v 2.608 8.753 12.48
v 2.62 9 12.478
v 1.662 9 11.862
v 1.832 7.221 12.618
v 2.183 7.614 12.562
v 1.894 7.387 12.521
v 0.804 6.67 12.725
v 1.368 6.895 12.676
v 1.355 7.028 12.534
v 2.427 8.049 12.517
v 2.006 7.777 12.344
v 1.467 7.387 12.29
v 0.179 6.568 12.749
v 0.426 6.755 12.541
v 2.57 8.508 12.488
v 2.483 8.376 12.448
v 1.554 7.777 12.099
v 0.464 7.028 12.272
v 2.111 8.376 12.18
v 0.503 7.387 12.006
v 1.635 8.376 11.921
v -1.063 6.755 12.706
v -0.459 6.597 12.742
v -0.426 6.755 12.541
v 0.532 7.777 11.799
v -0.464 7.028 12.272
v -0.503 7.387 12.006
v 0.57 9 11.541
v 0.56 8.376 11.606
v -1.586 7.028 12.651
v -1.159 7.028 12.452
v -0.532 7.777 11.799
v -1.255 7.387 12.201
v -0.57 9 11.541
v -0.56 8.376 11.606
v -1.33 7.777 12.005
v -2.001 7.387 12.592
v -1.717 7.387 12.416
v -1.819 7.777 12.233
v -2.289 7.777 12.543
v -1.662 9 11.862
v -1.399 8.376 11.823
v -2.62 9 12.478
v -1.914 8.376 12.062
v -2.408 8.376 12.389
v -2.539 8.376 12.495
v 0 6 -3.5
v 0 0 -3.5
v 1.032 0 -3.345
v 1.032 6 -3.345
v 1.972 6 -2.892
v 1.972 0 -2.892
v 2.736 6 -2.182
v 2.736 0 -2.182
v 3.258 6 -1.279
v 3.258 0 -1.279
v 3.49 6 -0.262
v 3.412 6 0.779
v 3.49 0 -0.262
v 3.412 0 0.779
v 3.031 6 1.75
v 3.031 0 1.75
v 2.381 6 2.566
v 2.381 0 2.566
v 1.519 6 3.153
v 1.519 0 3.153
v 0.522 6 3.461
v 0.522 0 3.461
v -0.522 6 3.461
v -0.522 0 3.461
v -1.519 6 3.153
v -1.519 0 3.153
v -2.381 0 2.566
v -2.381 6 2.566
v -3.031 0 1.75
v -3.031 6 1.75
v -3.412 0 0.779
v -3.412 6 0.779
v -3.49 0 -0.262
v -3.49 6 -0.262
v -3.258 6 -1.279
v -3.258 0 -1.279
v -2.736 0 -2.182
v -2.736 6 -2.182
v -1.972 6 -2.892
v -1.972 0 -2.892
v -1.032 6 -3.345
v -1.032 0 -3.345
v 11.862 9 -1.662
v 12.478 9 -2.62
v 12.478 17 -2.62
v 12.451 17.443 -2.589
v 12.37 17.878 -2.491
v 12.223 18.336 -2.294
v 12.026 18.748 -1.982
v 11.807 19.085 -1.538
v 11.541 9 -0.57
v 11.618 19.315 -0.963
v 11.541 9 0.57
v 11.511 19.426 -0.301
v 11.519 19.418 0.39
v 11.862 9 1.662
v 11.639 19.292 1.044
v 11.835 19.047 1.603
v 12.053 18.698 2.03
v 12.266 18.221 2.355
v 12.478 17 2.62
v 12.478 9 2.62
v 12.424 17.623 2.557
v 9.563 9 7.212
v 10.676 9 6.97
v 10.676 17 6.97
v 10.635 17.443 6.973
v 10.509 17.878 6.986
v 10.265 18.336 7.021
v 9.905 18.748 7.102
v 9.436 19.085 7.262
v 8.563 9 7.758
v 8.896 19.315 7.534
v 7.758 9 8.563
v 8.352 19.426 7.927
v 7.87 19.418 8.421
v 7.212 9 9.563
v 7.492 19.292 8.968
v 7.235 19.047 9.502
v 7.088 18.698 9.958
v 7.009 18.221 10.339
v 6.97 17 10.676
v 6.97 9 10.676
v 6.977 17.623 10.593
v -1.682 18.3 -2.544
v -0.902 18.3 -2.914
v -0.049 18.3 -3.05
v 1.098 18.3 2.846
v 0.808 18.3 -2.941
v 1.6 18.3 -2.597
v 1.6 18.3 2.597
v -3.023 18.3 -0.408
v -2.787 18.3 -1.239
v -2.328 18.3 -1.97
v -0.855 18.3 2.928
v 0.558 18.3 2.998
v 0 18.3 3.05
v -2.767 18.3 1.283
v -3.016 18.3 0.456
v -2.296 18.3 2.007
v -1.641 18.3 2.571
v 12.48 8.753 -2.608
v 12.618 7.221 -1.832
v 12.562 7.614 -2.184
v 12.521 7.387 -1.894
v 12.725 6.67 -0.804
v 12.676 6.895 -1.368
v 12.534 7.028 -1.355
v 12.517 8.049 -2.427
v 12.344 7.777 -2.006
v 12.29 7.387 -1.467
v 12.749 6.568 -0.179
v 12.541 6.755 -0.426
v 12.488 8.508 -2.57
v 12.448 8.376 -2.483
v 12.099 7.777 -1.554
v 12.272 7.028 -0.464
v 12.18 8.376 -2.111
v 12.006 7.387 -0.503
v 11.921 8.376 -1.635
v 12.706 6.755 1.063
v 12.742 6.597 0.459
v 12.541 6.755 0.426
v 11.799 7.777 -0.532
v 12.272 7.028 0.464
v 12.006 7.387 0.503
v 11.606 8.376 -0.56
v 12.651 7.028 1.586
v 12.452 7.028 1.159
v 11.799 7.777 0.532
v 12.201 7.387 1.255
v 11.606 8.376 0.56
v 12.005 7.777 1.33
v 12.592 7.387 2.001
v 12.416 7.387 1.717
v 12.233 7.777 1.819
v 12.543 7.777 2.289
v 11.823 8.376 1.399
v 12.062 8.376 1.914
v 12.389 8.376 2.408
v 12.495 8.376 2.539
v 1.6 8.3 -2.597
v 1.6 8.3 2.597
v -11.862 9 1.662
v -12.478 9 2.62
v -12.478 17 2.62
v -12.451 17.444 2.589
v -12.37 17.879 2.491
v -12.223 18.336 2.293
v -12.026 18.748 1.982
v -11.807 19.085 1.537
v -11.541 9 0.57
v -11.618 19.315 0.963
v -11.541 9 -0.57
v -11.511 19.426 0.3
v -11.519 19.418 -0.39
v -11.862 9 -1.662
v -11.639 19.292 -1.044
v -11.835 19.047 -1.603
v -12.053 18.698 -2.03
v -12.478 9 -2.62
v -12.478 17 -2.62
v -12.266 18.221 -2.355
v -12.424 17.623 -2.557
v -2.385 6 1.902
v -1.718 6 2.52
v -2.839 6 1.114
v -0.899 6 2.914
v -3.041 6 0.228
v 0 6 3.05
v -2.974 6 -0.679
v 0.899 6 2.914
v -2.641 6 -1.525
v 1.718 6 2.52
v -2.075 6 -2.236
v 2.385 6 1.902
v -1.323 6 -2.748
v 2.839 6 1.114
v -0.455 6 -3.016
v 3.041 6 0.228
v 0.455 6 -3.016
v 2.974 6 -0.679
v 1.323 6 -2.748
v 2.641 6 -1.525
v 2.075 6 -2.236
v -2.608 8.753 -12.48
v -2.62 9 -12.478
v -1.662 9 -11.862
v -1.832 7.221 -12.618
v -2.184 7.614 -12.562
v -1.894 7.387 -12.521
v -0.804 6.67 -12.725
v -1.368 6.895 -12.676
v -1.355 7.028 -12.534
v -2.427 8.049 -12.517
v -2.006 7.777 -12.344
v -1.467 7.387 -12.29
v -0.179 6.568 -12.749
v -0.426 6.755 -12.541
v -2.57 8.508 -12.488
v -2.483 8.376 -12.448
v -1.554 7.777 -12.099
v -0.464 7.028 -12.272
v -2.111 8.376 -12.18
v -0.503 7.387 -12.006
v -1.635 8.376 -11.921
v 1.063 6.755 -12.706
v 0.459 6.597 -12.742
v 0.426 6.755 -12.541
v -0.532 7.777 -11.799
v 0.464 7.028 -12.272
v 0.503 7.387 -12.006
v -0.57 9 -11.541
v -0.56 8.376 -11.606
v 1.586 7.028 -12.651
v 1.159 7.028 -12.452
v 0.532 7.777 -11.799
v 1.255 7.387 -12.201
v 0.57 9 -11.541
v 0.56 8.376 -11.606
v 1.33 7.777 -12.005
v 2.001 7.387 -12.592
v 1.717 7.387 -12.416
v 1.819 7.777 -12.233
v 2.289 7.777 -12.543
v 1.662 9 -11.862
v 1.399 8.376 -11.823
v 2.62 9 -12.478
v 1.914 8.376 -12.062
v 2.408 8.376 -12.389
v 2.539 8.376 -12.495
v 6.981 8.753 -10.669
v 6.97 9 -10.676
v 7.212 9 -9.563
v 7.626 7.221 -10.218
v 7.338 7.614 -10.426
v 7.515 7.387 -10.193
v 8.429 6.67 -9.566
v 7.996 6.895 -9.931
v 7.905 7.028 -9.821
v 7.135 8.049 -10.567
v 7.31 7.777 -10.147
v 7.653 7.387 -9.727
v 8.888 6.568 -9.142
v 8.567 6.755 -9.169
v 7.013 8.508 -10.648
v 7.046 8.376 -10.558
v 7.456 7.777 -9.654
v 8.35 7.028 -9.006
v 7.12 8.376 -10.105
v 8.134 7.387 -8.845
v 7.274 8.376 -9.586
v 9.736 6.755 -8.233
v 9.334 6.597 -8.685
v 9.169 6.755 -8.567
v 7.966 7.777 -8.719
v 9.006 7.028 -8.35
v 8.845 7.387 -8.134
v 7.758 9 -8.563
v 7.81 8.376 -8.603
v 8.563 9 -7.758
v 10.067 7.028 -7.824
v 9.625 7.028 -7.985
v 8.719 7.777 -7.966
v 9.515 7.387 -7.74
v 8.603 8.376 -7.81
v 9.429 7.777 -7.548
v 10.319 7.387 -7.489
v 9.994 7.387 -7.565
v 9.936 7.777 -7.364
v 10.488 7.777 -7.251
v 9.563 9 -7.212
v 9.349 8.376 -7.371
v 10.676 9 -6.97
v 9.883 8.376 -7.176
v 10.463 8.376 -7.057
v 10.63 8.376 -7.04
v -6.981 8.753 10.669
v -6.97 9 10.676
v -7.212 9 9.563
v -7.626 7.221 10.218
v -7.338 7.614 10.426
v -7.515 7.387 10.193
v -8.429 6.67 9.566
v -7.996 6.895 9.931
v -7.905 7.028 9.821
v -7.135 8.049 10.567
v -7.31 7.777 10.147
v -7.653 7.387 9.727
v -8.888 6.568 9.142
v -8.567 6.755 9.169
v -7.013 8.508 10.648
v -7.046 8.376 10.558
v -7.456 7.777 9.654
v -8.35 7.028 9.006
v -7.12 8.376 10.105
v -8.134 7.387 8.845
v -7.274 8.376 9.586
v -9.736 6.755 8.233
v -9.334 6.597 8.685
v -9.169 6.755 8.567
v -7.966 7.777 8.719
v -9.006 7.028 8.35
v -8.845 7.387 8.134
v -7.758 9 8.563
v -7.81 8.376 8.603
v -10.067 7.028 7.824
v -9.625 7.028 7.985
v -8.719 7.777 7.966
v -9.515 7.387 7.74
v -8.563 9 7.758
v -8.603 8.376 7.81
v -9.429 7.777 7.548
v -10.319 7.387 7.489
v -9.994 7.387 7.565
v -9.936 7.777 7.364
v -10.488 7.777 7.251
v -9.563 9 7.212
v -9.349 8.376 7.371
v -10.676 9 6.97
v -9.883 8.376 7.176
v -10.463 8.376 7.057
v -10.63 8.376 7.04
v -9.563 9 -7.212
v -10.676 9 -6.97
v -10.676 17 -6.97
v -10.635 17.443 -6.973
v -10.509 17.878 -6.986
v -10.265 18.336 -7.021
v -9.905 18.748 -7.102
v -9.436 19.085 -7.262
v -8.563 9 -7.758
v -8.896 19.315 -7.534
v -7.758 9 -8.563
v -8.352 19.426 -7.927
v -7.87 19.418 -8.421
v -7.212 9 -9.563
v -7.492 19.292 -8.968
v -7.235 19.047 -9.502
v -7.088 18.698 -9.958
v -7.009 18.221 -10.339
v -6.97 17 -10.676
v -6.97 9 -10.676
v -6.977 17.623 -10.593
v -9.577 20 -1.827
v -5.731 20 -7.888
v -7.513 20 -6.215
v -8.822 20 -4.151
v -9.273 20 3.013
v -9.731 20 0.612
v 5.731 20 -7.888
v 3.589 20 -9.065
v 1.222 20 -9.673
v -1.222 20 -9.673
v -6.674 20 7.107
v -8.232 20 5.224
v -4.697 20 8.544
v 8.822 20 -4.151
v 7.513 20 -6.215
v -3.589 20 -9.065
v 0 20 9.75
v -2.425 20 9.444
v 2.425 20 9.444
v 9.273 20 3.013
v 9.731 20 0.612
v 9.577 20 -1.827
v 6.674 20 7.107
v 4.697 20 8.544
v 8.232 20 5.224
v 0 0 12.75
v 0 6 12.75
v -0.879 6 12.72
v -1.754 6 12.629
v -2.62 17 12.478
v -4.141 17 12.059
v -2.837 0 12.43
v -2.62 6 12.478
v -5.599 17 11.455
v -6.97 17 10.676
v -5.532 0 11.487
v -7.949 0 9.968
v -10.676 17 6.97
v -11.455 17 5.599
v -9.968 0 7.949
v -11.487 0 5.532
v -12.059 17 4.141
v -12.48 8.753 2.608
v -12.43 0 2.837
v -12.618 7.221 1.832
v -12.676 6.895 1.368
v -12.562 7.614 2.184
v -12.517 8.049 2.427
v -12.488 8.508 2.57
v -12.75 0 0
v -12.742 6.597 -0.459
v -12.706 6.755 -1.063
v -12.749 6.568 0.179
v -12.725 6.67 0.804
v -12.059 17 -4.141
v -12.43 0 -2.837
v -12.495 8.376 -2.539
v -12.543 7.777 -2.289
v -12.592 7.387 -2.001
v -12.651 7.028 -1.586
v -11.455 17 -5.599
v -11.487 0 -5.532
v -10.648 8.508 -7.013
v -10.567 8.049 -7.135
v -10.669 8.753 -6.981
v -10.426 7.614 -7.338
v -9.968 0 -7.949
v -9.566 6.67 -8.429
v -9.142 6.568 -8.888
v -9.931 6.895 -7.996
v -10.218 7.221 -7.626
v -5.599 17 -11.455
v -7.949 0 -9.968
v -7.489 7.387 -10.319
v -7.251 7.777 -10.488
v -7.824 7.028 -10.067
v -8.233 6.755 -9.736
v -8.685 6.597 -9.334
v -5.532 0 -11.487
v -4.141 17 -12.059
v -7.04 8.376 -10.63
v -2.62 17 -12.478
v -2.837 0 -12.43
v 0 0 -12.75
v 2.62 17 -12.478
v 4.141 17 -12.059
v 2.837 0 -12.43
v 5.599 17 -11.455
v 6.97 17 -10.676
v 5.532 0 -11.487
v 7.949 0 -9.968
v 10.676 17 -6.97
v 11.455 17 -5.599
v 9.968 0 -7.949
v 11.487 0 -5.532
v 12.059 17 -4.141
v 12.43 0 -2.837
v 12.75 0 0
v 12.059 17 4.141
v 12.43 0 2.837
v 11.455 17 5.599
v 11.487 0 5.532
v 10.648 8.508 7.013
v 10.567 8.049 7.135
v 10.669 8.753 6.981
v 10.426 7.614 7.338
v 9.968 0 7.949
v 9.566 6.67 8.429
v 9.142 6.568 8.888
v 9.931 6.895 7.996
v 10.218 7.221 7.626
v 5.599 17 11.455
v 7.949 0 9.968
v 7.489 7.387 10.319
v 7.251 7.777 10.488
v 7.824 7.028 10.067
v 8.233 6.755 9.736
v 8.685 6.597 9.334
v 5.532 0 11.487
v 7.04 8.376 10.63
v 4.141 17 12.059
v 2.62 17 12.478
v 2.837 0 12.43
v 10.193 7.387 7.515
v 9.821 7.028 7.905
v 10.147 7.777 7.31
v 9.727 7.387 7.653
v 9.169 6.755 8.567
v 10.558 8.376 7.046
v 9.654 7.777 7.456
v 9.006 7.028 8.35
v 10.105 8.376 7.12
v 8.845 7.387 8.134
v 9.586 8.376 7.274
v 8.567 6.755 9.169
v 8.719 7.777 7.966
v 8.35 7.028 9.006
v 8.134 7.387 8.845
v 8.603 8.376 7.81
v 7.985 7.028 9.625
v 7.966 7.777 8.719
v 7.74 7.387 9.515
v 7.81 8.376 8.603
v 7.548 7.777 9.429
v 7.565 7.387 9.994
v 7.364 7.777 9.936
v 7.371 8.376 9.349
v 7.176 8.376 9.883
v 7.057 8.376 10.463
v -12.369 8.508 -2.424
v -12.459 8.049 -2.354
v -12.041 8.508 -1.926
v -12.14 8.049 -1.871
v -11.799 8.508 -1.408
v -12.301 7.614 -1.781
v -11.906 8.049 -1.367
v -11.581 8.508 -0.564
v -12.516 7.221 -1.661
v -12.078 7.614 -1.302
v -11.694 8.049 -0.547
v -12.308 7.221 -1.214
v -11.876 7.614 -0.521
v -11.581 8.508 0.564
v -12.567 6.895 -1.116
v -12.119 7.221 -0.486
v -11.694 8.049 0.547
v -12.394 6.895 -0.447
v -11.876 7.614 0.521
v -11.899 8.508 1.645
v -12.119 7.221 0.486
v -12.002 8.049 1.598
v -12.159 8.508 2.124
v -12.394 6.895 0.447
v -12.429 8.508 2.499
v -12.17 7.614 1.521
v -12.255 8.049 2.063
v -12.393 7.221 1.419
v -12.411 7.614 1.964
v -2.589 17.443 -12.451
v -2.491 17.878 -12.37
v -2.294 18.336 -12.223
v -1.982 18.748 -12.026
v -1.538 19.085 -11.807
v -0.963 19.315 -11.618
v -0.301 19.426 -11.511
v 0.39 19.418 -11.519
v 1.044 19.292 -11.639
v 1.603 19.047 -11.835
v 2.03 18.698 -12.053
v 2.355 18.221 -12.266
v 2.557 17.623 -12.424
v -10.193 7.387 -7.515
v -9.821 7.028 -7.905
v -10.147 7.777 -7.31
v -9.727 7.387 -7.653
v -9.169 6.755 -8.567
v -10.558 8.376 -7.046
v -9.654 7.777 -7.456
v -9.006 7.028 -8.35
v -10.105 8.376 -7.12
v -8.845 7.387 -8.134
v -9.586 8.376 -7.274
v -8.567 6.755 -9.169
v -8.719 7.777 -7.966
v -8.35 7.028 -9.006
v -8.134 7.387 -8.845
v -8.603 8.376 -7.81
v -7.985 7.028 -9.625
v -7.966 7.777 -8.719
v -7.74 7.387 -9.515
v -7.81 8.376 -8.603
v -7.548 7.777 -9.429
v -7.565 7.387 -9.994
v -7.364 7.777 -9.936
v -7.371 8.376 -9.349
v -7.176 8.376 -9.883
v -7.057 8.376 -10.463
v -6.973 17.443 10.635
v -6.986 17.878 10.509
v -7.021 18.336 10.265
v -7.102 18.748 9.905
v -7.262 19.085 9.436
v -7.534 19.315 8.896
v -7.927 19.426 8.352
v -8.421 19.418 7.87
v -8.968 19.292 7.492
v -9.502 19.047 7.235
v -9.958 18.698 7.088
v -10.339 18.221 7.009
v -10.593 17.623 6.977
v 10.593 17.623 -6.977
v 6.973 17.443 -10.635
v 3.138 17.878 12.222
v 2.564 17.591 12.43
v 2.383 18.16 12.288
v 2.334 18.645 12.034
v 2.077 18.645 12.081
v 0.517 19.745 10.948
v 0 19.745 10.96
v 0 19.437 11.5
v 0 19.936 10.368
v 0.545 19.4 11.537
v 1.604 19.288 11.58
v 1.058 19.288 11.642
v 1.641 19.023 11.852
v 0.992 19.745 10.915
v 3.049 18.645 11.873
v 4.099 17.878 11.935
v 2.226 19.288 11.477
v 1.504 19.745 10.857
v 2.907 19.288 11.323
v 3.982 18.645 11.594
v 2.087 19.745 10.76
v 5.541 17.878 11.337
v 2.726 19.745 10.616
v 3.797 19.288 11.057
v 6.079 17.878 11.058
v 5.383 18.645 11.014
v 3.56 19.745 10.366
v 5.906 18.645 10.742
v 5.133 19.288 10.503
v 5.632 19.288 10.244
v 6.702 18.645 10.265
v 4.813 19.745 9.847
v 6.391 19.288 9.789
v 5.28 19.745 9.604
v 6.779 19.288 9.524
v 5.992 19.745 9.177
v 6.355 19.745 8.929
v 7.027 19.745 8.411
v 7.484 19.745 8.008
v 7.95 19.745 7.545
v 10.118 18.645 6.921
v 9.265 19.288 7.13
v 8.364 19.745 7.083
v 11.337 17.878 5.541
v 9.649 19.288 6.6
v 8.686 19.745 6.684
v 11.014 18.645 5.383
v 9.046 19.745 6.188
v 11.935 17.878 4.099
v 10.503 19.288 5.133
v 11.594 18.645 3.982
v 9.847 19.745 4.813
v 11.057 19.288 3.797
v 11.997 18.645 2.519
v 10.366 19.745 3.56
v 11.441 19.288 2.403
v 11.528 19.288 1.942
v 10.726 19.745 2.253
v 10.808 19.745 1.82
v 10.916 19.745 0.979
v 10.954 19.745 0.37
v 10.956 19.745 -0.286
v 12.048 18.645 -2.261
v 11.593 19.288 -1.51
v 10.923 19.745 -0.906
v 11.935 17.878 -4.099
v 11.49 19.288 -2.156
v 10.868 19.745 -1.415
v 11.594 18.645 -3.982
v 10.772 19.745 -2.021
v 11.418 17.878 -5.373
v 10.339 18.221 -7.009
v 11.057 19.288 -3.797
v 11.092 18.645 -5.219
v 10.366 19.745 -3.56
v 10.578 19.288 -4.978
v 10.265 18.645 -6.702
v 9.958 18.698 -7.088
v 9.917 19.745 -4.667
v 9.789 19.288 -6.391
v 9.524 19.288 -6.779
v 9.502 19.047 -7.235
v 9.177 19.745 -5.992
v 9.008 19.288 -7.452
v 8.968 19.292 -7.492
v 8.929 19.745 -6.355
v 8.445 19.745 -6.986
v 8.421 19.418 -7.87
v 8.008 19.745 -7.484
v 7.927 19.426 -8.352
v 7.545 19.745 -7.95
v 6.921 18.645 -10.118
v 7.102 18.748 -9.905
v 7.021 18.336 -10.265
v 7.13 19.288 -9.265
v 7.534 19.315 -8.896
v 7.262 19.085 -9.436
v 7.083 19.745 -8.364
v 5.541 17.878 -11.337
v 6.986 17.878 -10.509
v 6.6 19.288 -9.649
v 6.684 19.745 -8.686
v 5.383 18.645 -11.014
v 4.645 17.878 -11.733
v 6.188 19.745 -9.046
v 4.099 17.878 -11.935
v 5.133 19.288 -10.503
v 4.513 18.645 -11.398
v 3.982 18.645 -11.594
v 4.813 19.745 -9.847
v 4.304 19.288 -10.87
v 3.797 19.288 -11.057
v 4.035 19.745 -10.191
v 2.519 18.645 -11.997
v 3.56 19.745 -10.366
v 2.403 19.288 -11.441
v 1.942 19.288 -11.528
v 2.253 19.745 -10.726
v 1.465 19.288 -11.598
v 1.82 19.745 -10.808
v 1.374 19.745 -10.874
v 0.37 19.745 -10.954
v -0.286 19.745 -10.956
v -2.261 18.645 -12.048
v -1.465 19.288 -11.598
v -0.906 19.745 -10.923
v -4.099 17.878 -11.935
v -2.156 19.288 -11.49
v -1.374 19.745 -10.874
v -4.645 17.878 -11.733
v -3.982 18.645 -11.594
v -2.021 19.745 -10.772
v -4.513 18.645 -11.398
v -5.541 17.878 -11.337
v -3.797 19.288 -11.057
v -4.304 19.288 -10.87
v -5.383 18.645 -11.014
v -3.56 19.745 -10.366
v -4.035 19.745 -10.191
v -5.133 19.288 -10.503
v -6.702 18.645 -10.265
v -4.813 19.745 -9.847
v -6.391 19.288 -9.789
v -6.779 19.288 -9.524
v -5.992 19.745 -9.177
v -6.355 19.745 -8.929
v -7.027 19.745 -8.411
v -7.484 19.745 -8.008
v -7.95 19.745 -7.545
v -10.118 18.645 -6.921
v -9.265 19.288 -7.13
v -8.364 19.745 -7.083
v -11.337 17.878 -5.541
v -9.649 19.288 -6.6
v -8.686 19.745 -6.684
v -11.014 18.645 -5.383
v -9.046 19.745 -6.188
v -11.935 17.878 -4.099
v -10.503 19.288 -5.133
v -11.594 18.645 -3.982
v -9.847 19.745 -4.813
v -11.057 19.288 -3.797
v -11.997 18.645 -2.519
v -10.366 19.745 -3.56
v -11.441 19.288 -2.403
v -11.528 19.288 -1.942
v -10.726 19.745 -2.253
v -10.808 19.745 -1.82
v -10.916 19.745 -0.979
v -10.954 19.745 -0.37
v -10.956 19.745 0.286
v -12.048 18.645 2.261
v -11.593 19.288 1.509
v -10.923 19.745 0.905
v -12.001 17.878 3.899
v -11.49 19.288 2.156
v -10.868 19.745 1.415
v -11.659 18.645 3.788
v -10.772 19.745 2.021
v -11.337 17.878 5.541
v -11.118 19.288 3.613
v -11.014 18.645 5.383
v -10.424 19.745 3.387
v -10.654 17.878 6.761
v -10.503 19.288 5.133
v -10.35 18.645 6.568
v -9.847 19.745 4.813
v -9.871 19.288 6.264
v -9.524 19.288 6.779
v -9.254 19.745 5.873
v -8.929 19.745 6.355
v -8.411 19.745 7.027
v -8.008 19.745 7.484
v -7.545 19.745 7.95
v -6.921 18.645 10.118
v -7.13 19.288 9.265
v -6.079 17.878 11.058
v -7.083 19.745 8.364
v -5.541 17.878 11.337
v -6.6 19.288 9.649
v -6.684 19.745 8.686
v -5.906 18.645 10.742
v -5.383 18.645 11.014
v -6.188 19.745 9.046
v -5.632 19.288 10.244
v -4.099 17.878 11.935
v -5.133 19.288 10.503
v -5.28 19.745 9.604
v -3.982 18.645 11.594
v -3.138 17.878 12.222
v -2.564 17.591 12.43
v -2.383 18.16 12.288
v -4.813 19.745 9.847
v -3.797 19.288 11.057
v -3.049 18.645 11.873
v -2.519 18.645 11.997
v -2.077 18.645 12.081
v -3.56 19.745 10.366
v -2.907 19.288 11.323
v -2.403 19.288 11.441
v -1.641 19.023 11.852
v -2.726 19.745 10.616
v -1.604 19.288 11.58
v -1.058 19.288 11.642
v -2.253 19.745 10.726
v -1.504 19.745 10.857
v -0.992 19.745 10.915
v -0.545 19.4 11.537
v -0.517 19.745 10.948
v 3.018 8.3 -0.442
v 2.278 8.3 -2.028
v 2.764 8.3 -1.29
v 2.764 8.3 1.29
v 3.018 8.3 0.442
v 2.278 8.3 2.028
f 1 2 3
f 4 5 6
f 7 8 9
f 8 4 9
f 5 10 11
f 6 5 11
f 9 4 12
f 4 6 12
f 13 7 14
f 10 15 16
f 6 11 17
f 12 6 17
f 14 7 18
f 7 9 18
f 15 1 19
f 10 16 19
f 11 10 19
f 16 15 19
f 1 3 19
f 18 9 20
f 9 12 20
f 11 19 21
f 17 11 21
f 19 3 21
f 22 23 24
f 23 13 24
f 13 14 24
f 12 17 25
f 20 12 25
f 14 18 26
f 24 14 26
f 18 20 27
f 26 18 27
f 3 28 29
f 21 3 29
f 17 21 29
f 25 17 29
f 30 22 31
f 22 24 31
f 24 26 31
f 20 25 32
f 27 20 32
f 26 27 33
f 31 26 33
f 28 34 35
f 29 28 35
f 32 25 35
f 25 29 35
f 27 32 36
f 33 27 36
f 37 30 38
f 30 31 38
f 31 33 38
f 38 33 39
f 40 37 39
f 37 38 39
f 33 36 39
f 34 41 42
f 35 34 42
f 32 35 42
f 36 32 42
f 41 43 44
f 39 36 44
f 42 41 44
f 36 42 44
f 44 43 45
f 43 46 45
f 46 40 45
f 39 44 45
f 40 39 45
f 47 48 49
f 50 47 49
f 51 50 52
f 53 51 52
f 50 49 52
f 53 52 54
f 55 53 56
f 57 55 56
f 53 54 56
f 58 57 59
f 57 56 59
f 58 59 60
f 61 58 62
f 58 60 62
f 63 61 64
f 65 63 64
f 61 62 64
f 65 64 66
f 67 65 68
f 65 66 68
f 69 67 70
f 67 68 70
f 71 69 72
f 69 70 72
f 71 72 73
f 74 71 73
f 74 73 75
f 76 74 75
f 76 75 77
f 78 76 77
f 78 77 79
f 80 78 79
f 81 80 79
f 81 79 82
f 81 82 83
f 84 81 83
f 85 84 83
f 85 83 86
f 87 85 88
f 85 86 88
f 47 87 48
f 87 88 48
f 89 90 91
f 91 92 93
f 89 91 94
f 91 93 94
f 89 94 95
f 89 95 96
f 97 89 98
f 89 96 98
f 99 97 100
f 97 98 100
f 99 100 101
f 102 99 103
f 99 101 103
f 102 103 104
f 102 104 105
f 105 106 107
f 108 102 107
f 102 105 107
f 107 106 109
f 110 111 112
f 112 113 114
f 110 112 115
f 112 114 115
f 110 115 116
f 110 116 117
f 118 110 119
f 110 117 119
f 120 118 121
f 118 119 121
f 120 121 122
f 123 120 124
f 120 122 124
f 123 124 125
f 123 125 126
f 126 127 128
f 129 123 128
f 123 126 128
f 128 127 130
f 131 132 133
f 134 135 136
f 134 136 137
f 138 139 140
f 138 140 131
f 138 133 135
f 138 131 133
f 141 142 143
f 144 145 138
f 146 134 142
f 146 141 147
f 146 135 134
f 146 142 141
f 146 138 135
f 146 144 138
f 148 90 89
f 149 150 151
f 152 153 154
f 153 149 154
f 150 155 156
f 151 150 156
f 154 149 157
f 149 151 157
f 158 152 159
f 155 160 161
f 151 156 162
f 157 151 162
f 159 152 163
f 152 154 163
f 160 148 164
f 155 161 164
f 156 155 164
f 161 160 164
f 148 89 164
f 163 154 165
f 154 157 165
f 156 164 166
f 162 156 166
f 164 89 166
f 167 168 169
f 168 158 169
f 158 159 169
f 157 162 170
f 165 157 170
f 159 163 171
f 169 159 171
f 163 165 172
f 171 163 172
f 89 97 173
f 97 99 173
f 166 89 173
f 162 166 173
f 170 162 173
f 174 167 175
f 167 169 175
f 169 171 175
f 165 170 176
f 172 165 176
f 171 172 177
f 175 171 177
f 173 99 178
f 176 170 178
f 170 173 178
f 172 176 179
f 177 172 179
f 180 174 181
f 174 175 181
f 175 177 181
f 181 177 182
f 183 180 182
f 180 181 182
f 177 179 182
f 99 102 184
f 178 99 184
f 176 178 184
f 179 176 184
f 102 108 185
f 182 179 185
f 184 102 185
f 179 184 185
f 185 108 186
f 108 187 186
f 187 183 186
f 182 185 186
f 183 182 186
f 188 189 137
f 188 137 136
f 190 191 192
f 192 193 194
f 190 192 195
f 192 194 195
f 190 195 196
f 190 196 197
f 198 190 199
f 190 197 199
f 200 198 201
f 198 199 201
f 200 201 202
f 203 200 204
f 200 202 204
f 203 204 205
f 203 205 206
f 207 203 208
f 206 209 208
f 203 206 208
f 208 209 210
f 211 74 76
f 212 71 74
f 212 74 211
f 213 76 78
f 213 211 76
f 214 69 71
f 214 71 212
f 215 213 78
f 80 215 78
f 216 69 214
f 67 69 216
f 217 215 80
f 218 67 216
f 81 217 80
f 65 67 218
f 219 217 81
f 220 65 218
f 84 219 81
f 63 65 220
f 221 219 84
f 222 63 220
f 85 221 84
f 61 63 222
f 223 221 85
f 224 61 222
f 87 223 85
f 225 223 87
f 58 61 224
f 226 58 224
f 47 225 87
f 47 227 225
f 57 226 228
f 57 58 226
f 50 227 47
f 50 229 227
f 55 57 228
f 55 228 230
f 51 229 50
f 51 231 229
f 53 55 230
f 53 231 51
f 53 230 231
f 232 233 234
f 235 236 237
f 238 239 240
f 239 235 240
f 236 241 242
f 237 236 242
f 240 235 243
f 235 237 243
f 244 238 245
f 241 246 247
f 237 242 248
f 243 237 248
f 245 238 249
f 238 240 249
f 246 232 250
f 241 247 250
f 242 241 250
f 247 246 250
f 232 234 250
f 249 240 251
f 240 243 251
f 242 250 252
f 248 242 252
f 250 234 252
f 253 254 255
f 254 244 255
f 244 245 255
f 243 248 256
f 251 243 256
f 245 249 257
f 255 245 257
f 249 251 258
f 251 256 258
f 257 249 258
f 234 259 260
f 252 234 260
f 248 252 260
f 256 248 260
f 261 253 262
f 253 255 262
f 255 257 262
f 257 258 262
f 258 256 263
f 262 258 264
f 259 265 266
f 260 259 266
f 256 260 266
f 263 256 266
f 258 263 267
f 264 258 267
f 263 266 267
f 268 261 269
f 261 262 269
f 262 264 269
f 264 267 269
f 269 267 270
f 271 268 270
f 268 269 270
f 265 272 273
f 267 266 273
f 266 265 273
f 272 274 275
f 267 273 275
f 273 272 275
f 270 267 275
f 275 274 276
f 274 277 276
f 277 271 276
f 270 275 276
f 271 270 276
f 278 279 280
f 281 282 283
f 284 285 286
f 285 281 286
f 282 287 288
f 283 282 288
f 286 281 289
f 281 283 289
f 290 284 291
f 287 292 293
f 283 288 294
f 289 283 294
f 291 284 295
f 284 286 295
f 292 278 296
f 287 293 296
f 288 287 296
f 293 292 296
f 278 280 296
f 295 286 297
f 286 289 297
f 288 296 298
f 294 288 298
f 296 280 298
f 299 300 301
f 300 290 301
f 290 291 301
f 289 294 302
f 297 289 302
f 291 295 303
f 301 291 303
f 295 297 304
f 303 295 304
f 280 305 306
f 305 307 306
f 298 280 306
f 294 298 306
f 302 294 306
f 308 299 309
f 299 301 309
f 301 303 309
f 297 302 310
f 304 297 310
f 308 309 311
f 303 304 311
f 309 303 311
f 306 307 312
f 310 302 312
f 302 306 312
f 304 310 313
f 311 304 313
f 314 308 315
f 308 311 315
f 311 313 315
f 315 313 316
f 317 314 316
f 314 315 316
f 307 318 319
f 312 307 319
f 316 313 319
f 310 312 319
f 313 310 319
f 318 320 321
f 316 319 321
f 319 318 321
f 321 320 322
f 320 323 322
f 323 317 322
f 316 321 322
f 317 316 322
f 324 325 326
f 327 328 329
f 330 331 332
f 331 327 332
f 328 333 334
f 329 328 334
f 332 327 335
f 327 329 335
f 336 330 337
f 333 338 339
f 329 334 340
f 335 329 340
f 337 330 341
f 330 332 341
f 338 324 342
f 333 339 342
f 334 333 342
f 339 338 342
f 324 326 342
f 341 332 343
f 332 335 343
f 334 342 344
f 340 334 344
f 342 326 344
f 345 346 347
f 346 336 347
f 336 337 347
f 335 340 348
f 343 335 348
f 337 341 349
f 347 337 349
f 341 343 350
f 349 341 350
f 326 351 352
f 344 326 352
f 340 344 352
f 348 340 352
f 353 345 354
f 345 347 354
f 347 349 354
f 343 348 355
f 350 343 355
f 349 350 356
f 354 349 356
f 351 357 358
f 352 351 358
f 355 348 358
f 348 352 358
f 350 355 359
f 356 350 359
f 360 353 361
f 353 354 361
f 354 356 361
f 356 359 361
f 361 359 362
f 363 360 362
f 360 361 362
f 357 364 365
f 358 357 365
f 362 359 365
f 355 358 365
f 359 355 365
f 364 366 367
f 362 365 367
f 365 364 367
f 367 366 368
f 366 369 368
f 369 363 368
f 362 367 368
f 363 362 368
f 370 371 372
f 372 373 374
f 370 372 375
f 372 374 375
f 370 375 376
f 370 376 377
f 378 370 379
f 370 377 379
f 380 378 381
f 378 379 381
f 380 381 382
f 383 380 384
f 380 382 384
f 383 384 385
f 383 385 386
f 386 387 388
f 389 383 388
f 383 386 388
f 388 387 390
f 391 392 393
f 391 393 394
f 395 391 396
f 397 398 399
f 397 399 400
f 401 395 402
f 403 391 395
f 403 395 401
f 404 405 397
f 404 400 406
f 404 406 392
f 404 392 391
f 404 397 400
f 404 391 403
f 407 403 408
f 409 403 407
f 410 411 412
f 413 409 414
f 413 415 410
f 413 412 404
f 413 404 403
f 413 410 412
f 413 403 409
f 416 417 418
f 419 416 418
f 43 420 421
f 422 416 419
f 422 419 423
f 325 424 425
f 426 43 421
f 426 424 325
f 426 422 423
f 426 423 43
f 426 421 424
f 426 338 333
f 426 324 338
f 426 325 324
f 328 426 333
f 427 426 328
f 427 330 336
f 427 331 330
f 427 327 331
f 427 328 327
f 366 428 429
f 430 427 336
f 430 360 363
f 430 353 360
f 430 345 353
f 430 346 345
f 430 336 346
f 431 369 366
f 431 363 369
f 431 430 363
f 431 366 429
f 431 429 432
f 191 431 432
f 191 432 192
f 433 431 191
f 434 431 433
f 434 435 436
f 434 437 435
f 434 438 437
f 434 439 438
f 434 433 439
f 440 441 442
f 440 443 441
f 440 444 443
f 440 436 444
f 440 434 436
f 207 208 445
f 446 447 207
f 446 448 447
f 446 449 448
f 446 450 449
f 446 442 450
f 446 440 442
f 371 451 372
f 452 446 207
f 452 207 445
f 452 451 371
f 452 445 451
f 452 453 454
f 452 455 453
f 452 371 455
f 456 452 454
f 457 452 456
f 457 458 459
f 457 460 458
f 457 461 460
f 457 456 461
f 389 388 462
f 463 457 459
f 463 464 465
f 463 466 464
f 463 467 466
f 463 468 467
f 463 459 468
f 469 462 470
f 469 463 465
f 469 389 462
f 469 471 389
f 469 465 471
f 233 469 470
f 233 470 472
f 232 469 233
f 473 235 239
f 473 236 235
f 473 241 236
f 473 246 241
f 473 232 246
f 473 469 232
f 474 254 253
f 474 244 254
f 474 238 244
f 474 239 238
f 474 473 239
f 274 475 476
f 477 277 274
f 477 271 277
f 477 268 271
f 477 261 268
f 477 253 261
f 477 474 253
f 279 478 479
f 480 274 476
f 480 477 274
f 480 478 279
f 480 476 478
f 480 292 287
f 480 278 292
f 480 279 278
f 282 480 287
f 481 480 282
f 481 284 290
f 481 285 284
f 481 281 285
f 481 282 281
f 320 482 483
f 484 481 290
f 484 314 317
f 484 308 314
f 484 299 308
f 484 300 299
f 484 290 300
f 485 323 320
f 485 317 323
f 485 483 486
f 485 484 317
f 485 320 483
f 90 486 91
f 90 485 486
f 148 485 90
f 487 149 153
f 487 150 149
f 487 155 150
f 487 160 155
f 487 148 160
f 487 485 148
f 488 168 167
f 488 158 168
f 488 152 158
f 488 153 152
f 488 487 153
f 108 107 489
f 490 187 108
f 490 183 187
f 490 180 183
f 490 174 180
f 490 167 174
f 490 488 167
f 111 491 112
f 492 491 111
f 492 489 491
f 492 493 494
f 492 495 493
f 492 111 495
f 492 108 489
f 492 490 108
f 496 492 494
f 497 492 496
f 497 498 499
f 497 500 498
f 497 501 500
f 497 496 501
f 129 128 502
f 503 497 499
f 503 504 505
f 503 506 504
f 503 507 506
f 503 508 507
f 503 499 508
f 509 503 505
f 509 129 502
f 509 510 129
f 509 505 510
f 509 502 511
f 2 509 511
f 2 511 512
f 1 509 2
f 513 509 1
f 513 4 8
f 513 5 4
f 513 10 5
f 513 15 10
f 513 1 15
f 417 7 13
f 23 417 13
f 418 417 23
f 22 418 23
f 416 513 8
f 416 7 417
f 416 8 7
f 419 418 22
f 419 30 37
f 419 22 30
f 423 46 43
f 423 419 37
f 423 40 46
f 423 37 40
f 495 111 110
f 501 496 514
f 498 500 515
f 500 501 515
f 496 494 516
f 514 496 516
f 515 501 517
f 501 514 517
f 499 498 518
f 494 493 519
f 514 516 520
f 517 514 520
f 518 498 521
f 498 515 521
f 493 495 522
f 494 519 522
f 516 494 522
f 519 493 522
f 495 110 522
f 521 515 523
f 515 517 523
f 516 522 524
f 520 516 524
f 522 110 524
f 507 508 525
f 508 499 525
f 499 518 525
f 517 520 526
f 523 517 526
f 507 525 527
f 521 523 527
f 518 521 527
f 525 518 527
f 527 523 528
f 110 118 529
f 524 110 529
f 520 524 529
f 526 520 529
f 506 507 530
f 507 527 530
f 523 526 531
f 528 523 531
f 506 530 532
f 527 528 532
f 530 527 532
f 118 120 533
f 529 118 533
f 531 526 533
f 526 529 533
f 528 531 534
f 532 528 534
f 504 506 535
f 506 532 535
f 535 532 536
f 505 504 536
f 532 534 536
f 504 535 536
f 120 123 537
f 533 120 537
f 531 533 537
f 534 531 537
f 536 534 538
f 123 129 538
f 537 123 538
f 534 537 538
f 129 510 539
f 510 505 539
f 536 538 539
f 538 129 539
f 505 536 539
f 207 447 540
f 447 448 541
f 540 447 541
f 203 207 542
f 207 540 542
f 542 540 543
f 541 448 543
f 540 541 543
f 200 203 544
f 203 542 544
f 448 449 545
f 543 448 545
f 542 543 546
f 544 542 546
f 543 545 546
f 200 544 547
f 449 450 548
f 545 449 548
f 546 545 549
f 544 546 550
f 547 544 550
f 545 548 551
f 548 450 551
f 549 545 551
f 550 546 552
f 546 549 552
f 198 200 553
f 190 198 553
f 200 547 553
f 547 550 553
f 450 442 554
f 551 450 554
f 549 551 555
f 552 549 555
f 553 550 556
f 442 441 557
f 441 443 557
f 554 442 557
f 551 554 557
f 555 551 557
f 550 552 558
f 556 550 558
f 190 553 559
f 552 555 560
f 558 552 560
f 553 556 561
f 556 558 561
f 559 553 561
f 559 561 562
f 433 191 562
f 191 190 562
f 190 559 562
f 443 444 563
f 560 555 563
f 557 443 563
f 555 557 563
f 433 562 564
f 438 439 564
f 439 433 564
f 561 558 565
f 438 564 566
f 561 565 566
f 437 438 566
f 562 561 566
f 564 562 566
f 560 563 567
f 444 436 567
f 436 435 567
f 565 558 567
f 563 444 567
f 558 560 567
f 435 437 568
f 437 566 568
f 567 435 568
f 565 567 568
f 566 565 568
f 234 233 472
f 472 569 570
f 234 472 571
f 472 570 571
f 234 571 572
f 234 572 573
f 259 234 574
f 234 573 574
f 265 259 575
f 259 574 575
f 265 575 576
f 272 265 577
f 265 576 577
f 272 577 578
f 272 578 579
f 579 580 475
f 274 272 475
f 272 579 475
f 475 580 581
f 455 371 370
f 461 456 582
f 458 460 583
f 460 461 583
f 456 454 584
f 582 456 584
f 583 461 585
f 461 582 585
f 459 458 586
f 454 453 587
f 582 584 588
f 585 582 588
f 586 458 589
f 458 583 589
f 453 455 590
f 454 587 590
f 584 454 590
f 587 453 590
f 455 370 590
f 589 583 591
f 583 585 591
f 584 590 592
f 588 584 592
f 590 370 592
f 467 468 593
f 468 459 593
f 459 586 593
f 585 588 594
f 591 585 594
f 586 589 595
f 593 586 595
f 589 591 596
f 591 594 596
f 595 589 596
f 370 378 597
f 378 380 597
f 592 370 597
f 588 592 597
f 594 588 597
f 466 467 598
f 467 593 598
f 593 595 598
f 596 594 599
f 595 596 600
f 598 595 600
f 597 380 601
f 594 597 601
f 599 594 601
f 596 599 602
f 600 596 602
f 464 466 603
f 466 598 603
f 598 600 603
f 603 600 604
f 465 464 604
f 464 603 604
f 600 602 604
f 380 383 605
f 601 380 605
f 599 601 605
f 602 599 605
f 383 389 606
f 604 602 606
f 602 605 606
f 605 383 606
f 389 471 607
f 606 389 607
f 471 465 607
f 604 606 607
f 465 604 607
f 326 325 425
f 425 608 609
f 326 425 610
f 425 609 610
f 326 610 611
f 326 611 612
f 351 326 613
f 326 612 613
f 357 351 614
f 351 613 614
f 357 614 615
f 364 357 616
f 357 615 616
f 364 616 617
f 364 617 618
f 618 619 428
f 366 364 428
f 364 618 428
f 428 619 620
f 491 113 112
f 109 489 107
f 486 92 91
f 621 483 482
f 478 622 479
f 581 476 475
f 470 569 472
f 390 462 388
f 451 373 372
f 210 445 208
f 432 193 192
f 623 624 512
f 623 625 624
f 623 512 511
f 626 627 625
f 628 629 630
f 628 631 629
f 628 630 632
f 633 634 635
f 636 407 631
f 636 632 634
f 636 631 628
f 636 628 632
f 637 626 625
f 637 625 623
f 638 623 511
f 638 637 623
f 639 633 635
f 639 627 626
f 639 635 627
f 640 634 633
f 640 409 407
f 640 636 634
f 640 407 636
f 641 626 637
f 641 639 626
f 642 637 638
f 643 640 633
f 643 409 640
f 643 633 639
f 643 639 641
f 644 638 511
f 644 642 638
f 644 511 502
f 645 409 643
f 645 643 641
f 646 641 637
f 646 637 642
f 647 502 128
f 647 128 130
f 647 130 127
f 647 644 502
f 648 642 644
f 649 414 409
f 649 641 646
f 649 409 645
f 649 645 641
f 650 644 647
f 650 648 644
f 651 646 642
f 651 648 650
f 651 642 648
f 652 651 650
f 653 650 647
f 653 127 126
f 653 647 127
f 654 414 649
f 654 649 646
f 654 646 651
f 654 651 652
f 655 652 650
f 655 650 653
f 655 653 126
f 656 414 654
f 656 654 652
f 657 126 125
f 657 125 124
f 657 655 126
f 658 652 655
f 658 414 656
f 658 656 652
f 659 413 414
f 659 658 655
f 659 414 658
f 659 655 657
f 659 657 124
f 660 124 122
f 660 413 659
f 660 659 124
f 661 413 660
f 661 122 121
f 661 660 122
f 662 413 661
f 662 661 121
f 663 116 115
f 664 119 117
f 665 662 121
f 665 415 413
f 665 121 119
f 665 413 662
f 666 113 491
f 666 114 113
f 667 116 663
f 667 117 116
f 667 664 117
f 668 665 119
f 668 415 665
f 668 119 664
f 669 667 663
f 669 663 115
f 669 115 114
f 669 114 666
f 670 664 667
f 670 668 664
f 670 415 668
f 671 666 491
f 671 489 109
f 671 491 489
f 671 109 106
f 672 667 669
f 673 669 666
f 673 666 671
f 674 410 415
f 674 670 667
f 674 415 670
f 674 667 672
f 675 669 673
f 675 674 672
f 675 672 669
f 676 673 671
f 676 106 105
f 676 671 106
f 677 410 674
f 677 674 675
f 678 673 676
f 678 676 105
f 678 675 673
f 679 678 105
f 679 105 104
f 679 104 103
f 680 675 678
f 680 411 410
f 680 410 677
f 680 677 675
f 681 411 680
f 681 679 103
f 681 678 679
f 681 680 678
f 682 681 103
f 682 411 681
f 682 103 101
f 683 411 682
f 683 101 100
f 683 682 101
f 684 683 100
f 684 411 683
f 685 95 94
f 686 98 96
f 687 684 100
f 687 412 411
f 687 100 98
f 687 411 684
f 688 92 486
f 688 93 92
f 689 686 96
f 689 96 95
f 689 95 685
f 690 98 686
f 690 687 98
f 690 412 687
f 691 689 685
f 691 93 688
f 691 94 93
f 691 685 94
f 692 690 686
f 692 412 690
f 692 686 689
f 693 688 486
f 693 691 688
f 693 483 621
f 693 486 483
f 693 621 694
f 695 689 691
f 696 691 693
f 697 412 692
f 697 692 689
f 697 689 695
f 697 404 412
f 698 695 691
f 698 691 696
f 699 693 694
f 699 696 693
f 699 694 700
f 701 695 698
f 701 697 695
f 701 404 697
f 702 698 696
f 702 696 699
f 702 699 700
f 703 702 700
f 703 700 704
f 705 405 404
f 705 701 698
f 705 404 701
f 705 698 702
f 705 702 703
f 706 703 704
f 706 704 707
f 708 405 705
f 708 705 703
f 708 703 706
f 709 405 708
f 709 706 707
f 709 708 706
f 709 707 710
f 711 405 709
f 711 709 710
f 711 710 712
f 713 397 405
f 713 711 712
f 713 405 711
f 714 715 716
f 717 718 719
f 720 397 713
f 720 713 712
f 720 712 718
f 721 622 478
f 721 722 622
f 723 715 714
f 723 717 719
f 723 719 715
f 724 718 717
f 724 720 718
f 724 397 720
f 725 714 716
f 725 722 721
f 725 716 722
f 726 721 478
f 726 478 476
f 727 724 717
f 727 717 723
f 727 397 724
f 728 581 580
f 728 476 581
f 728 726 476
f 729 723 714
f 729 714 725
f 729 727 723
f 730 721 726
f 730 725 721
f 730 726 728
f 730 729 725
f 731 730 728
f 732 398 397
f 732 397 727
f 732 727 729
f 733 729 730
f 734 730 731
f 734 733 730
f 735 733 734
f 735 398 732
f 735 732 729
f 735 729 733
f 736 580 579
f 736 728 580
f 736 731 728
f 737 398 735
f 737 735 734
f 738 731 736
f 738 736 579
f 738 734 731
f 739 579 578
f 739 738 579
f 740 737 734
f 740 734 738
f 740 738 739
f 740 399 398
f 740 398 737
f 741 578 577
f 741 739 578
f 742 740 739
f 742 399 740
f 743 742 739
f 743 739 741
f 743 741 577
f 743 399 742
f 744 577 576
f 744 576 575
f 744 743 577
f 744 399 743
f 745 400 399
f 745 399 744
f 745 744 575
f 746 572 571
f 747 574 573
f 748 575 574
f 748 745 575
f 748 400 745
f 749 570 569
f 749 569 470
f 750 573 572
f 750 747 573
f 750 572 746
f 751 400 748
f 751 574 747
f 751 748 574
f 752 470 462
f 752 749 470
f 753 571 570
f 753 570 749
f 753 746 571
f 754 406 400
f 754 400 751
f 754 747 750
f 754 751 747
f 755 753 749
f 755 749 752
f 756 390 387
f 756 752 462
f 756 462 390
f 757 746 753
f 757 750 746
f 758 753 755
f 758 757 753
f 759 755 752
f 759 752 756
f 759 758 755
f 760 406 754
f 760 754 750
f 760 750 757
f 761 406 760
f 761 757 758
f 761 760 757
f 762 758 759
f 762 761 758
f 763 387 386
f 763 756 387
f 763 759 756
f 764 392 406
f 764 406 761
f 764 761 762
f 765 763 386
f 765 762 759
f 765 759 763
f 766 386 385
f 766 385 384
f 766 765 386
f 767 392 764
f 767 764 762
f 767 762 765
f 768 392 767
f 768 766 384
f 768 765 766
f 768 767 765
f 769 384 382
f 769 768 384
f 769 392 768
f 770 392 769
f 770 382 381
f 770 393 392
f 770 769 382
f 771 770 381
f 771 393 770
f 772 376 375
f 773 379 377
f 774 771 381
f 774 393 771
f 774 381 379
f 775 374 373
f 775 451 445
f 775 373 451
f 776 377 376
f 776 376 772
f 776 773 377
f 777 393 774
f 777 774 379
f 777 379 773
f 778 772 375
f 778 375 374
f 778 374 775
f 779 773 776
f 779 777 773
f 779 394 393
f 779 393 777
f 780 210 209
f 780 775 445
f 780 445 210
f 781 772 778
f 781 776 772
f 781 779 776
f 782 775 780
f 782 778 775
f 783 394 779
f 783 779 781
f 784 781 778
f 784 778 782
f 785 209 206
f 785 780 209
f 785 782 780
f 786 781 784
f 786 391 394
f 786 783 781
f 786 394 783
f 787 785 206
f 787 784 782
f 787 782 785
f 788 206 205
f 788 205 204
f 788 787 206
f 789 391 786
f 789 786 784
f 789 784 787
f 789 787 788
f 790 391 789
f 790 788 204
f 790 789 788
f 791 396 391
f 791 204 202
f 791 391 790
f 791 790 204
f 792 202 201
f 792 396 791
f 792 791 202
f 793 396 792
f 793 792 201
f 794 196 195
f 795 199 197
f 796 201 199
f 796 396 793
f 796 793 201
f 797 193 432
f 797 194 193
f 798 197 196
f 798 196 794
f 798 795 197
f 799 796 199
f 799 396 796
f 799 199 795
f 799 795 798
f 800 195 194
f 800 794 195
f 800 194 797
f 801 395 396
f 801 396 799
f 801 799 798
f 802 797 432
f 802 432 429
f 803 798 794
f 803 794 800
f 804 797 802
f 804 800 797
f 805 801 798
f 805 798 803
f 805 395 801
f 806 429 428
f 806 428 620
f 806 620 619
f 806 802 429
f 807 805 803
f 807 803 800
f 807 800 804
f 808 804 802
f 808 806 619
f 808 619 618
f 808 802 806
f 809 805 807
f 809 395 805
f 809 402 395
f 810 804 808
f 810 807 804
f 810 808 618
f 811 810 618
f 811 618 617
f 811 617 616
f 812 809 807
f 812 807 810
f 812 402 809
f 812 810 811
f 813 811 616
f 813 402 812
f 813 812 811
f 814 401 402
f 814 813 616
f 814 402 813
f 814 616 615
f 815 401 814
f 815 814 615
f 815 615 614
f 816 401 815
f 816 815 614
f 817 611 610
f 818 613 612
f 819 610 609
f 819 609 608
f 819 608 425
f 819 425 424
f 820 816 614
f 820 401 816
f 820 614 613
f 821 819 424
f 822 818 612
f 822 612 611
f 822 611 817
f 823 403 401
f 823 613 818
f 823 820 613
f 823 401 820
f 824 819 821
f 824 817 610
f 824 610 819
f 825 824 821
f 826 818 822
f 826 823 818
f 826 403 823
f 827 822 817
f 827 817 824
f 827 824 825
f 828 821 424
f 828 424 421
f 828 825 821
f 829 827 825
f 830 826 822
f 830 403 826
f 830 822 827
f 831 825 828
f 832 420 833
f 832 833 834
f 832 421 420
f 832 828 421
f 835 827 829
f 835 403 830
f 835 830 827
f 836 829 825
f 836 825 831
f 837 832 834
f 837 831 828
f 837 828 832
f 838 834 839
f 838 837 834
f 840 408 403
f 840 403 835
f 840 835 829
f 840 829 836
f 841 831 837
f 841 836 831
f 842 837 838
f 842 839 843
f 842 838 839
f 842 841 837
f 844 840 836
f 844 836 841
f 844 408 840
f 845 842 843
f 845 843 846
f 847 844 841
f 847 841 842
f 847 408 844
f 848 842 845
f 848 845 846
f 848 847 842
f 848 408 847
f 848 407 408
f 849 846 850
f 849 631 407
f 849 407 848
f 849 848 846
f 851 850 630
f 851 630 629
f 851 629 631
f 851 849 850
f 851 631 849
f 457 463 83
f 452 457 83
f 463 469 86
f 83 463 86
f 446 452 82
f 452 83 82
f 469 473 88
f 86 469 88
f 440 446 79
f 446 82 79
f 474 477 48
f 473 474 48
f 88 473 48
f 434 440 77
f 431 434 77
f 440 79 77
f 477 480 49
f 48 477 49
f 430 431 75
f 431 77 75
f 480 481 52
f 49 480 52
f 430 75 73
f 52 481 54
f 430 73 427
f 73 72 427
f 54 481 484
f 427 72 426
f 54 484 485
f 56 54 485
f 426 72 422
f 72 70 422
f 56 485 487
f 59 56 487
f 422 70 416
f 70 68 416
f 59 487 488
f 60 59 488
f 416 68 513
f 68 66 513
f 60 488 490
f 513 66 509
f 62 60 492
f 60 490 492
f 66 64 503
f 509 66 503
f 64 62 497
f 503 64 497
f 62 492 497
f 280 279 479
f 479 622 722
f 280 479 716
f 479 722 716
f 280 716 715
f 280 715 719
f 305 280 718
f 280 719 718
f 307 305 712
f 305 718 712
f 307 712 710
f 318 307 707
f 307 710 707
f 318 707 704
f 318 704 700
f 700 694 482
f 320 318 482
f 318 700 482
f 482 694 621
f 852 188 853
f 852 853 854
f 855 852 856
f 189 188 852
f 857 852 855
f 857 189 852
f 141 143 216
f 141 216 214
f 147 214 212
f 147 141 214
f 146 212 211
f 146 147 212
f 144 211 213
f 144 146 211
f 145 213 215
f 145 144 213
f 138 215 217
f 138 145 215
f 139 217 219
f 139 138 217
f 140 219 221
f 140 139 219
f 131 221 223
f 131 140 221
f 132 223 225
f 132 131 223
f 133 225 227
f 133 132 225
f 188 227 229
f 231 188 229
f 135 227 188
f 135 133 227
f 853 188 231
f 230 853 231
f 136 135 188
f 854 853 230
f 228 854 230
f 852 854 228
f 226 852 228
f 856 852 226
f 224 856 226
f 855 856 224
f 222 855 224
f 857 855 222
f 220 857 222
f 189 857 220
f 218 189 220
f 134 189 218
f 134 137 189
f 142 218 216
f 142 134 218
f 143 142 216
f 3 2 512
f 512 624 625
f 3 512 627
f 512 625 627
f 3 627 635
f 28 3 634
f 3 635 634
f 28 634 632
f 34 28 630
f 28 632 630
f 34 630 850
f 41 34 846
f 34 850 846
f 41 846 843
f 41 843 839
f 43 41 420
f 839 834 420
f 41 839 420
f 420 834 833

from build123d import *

# Parameters (mm, degrees)
SKETCH1_R               = 12.75
BOSS_EXTRUDE1_DEPTH     = 20
CUT_EXTRUDE1_DEPTH      = 27.928145127
CUT_EXTRUDE1_DEPTH_BACK = 18.3
SKETCH2_R               = 3.05
SKETCH3_R               = 3.5
CUT_EXTRUDE2_DEPTH      = 6
FILLET1_R               = 3
SKETCH5_R               = 4
CUT_EXTRUDE3_DEPTH      = 14
FILLET3_R               = 3
BOSS_EXTRUDE2_START     = 10
BOSS_EXTRUDE2_DEPTH     = 10


with BuildPart() as part:
    # Sketch1 → Boss-Extrude1 (new body)
    with BuildSketch(Plane(origin=(0, 0, 0), x_dir=(1, 0, 0), z_dir=(0, 1, 0))):
        with Locations(Location((0, 0, 0), (0, 0, 270))):
            Circle(SKETCH1_R)
    extrude(amount=BOSS_EXTRUDE1_DEPTH)

    # Sketch2 → Cut-Extrude1 (cut, two sides: drawn at the far end of the back side and taken through both)
    with BuildSketch(Plane.XZ.offset(-CUT_EXTRUDE1_DEPTH_BACK)):
        with Locations(Location((0, 0, 0), (0, 0, 90))):
            Circle(SKETCH2_R)
    extrude(amount=CUT_EXTRUDE1_DEPTH + CUT_EXTRUDE1_DEPTH_BACK, mode=Mode.SUBTRACT)

    # Sketch3 → Cut-Extrude2 (cut)
    with BuildSketch(Plane.XZ):
        with Locations(Location((0, 0, 0), (0, 0, 270))):
            Circle(SKETCH3_R)
    extrude(amount=-CUT_EXTRUDE2_DEPTH, mode=Mode.SUBTRACT)

    # Fillet1
    fillet1_edges = [part.edges().sort_by_distance(p)[0] for p in [
        (0, 20, -12.75),
    ]]
    fillet(fillet1_edges, radius=FILLET1_R)

    # Sketch5 → Cut-Extrude3 (cut)
    with BuildSketch(Plane(origin=(0, 20, 0), x_dir=(1, 0, 0), z_dir=(0, 1, 0))):
        with Locations((0, 15.5)):
            Circle(SKETCH5_R)
        with Locations((10.960155108, 10.960155108)):
            Circle(SKETCH5_R)
        with Locations((15.5, 0)):
            Circle(SKETCH5_R)
        with Locations((10.960155108, -10.960155108)):
            Circle(SKETCH5_R)
        with Locations((0, -15.5)):
            Circle(SKETCH5_R)
        with Locations((-10.960155108, -10.960155108)):
            Circle(SKETCH5_R)
        with Locations((-15.5, 0)):
            Circle(SKETCH5_R)
        with Locations((-10.960155108, 10.960155108)):
            Circle(SKETCH5_R)
    extrude(amount=-CUT_EXTRUDE3_DEPTH, mode=Mode.SUBTRACT)

    # Fillet3
    # the kernel refuses this fillet: 3 mm, written as the material it adds along each edge
    with BuildSketch(Plane(origin=(0, 6, 15.5), x_dir=(0.5240999982324142, 0, 0.8516567335803691), z_dir=(-0.8516567335803691, 0, 0.5240999982324142))) as fillet3_piece_1_section:
        with BuildLine():
            CenterArc((4 - FILLET3_R, FILLET3_R), FILLET3_R, 270, 90)
            Line((4 - FILLET3_R, 0), (4, 0))
            Line((4, 0), (4, FILLET3_R))
        make_face()
    fillet3_piece_1 = revolve(axis=Axis((0, 6, 15.5), (0, 1, 0)), revolution_arc=296.784649365, mode=Mode.PRIVATE)
    fillet3_piece_1 = fillet3_piece_1 & Plane(origin=(0, 6.906503108, 0), x_dir=(0, 0, 1), z_dir=(0, -1, 0)) * Cylinder(12.75, 17, mode=Mode.PRIVATE)
    add(fillet3_piece_1)
    with BuildSketch(Plane(origin=(-10.960155108, 6, 10.960155108), x_dir=(-0.2316175887878651, 0, 0.9728069143278617), z_dir=(-0.9728069143278617, 0, -0.2316175887878651))) as fillet3_piece_2_section:
        with BuildLine():
            CenterArc((4 - FILLET3_R, FILLET3_R), FILLET3_R, 270, 90)
            Line((4, FILLET3_R), (4, 0))
            Line((4, 0), (4 - FILLET3_R, 0))
        make_face()
    fillet3_piece_2 = revolve(axis=Axis((-10.960155108, 6, 10.960155108), (0, 1, 0)), revolution_arc=296.784649365, mode=Mode.PRIVATE)
    fillet3_piece_2 = fillet3_piece_2 & Plane(origin=(0, 6.906501973, 0), x_dir=(0, 0, 1), z_dir=(0, -1, 0)) * Cylinder(12.75, 16, mode=Mode.PRIVATE)
    add(fillet3_piece_2)
    with BuildSketch(Plane(origin=(-15.5, 6, 0), x_dir=(-0.8516567335803689, 0, -0.524099998232414), z_dir=(-0.524099998232414, 0, 0.8516567335803689))) as fillet3_piece_3_section:
        with BuildLine():
            CenterArc((4 - FILLET3_R, -FILLET3_R), FILLET3_R, 0, 90)
            Line((4, -FILLET3_R), (4, 0))
            Line((4, 0), (4 - FILLET3_R, 0))
        make_face()
    fillet3_piece_3 = revolve(axis=Axis((-15.5, 6, 0), (0, -1, 0)), revolution_arc=296.784649365, mode=Mode.PRIVATE)
    fillet3_piece_3 = fillet3_piece_3 & Plane(origin=(0, 6.90650195, 0), x_dir=(0, 0, 1), z_dir=(0, -1, 0)) * Cylinder(12.75, 16, mode=Mode.PRIVATE)
    add(fillet3_piece_3)
    with BuildSketch(Plane(origin=(-10.960155108, 6, -10.960155108), x_dir=(-0.9728069143278615, 0, -0.23161758878786548), z_dir=(0.23161758878786548, 0, -0.9728069143278615))) as fillet3_piece_4_section:
        with BuildLine():
            CenterArc((4 - FILLET3_R, FILLET3_R), FILLET3_R, 270, 90)
            Line((4, FILLET3_R), (4, 0))
            Line((4, 0), (4 - FILLET3_R, 0))
        make_face()
    fillet3_piece_4 = revolve(axis=Axis((-10.960155108, 6, -10.960155108), (0, 1, 0)), revolution_arc=296.784649365, mode=Mode.PRIVATE)
    fillet3_piece_4 = fillet3_piece_4 & Plane(origin=(0, 6.906501973, 0), x_dir=(0, 0, 1), z_dir=(0, -1, 0)) * Cylinder(12.75, 17, mode=Mode.PRIVATE)
    add(fillet3_piece_4)
    with BuildSketch(Plane(origin=(0, 6, -15.5), x_dir=(-0.5240999982324135, 0, -0.8516567335803694), z_dir=(0.8516567335803694, 0, -0.5240999982324135))) as fillet3_piece_5_section:
        with BuildLine():
            CenterArc((4 - FILLET3_R, FILLET3_R), FILLET3_R, 270, 90)
            Line((4, FILLET3_R), (4, 0))
            Line((4, 0), (4 - FILLET3_R, 0))
        make_face()
    fillet3_piece_5 = revolve(axis=Axis((0, 6, -15.5), (0, 1, 0)), revolution_arc=296.784649365, mode=Mode.PRIVATE)
    fillet3_piece_5 = fillet3_piece_5 & Plane(origin=(0, 6.906501973, 0), x_dir=(0, 0, 1), z_dir=(0, -1, 0)) * Cylinder(12.75, 16, mode=Mode.PRIVATE)
    add(fillet3_piece_5)
    with BuildSketch(Plane(origin=(10.960155108, 6, -10.960155108), x_dir=(0.2316175887878651, 0, -0.9728069143278617), z_dir=(0.9728069143278617, 0, 0.2316175887878651))) as fillet3_piece_6_section:
        with BuildLine():
            CenterArc((4 - FILLET3_R, FILLET3_R), FILLET3_R, 270, 90)
            Line((4, FILLET3_R), (4, 0))
            Line((4, 0), (4 - FILLET3_R, 0))
        make_face()
    fillet3_piece_6 = revolve(axis=Axis((10.960155108, 6, -10.960155108), (0, 1, 0)), revolution_arc=296.784649365, mode=Mode.PRIVATE)
    fillet3_piece_6 = fillet3_piece_6 & Plane(origin=(0, 6.906501973, 0), x_dir=(0, 0, 1), z_dir=(0, -1, 0)) * Cylinder(12.75, 16, mode=Mode.PRIVATE)
    add(fillet3_piece_6)
    with BuildSketch(Plane(origin=(15.5, 6, 0), x_dir=(0.8516567335803694, 0, -0.5240999982324135), z_dir=(0.5240999982324135, 0, 0.8516567335803694))) as fillet3_piece_7_section:
        with BuildLine():
            CenterArc((4 - FILLET3_R, FILLET3_R), FILLET3_R, 270, 90)
            Line((4, FILLET3_R), (4, 0))
            Line((4, 0), (4 - FILLET3_R, 0))
        make_face()
    fillet3_piece_7 = revolve(axis=Axis((15.5, 6, 0), (0, 1, 0)), revolution_arc=296.784649365, mode=Mode.PRIVATE)
    fillet3_piece_7 = fillet3_piece_7 & Plane(origin=(0, 6.906501973, 0), x_dir=(0, 0, 1), z_dir=(0, -1, 0)) * Cylinder(12.75, 17, mode=Mode.PRIVATE)
    add(fillet3_piece_7)
    with BuildSketch(Plane(origin=(10.960155108, 6, 10.960155108), x_dir=(0.9728069143278617, 0, 0.2316175887878651), z_dir=(-0.2316175887878651, 0, 0.9728069143278617))) as fillet3_piece_8_section:
        with BuildLine():
            CenterArc((4 - FILLET3_R, FILLET3_R), FILLET3_R, 270, 90)
            Line((4, FILLET3_R), (4, 0))
            Line((4, 0), (4 - FILLET3_R, 0))
        make_face()
    fillet3_piece_8 = revolve(axis=Axis((10.960155108, 6, 10.960155108), (0, 1, 0)), revolution_arc=296.784649365, mode=Mode.PRIVATE)
    fillet3_piece_8 = fillet3_piece_8 & Plane(origin=(0, 6.906501973, 0), x_dir=(0, 0, 1), z_dir=(0, -1, 0)) * Cylinder(12.75, 16, mode=Mode.PRIVATE)
    add(fillet3_piece_8)

    # Sketch6 → Boss-Extrude2 (add)
    with BuildSketch(Plane.XZ.offset(-18.3).offset(BOSS_EXTRUDE2_START)):
        with BuildLine():
            Line((1.6, 2.596632435), (1.6, -2.596632435))
            ThreePointArc((1.6, -2.596632435), (3.05, 0), (1.6, 2.596632435))
        make_face()
    extrude(amount=-BOSS_EXTRUDE2_DEPTH)


solid = part.part
